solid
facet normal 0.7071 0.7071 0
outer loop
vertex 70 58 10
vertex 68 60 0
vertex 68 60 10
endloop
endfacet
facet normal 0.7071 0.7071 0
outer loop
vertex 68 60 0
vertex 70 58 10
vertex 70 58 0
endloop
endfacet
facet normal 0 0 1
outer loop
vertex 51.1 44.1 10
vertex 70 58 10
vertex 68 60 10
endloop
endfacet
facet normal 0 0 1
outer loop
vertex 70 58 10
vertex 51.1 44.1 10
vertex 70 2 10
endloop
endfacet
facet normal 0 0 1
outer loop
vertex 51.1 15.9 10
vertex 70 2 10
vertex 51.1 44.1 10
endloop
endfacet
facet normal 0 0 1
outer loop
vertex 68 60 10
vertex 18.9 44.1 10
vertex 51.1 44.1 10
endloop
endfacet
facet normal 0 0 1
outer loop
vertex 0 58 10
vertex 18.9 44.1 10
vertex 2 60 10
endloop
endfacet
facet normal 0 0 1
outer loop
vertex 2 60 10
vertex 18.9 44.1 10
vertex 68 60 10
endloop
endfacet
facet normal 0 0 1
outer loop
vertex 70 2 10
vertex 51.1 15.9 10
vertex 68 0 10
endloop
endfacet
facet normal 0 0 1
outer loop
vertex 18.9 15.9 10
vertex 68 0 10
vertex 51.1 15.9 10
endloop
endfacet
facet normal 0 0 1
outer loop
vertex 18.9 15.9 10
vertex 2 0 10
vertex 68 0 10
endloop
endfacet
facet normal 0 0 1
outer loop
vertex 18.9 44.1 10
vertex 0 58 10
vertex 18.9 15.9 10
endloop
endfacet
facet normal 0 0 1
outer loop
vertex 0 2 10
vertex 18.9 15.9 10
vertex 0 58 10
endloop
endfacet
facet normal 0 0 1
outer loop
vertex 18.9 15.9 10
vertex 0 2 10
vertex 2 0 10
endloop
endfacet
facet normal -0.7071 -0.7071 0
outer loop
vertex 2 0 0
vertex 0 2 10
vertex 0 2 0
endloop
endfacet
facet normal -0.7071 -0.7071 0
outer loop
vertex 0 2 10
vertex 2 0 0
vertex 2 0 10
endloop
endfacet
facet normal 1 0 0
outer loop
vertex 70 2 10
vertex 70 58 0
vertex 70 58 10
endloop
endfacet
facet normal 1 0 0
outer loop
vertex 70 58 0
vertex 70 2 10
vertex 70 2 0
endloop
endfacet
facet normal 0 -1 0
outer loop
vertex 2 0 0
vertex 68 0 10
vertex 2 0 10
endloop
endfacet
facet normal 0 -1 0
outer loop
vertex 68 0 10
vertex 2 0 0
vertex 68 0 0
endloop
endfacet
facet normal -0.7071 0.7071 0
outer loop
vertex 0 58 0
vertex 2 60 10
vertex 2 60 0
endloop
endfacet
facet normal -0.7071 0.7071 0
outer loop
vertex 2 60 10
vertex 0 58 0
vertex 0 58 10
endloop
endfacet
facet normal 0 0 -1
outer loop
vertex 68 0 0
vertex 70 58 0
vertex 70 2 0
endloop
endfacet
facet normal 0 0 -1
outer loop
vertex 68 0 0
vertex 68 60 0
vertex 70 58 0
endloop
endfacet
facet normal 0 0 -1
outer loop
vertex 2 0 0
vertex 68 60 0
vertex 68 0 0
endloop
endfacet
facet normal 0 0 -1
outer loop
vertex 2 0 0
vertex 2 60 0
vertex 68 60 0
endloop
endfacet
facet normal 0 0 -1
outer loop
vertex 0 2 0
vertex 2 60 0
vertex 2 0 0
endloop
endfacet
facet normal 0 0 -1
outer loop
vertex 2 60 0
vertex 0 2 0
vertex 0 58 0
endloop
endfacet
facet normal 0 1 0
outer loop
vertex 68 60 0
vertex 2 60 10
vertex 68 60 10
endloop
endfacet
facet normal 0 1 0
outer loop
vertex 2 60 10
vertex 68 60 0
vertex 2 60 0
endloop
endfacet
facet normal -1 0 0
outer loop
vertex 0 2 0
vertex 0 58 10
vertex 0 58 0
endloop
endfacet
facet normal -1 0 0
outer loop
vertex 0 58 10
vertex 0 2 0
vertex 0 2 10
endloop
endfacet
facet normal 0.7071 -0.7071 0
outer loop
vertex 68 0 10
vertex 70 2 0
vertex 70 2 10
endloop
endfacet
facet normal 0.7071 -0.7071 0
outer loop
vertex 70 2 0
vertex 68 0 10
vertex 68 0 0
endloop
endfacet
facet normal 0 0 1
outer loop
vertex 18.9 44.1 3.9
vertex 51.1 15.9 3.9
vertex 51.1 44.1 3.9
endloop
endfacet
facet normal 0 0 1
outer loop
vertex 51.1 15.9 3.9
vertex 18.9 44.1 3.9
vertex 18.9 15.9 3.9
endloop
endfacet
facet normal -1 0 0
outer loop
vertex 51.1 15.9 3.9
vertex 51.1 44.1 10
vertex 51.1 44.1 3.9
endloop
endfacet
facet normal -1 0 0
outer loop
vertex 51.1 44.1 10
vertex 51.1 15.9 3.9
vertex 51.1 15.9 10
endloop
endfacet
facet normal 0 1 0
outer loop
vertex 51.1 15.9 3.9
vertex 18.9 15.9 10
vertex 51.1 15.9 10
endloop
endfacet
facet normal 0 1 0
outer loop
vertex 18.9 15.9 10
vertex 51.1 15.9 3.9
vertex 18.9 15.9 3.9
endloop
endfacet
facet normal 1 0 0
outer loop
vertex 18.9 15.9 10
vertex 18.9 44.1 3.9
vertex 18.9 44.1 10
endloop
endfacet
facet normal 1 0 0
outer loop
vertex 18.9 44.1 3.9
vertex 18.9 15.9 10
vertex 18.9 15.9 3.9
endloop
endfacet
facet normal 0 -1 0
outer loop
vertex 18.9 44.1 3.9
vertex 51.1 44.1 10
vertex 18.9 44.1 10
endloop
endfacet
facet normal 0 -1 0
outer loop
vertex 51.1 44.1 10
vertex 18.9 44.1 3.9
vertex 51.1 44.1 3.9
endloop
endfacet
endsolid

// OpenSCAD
$fn = 32;

// ----------------------------------------------------------------------
// Windowed plate: 1 voids, 70 x 60 x 10 mm
// ----------------------------------------------------------------------

// --- parameters (mm) ---
plate_l = 70;             // plate length, X
plate_w = 60;             // plate width, Y
plate_t = 10;             // plate thickness, Z
edge_margin = 12;         // wall from the plate edge to any window
win1_l = 32.2;            // window length
win1_w = 28.2;            // window width
depth_1 = 6.1;            // depth of void 1 (full thickness = through)
corner_c = 2;             // corner chamfer of the plate

profile = [[2, 0], [68, 0], [70, 2], [70, 58], [68, 60], [2, 60], [0, 58], [0, 2]];  // primary outline, 8 points, counter clockwise
void_1 = [[18.9, 15.9], [51.1, 15.9], [51.1, 44.1], [18.9, 44.1]];  // large central window, 4 points

// --- the one profile operation ---
difference() {
  linear_extrude(height = plate_t) polygon(points = profile);
  translate([0, 0, plate_t - depth_1])
    linear_extrude(height = depth_1 + 1) polygon(points = void_1);
}
